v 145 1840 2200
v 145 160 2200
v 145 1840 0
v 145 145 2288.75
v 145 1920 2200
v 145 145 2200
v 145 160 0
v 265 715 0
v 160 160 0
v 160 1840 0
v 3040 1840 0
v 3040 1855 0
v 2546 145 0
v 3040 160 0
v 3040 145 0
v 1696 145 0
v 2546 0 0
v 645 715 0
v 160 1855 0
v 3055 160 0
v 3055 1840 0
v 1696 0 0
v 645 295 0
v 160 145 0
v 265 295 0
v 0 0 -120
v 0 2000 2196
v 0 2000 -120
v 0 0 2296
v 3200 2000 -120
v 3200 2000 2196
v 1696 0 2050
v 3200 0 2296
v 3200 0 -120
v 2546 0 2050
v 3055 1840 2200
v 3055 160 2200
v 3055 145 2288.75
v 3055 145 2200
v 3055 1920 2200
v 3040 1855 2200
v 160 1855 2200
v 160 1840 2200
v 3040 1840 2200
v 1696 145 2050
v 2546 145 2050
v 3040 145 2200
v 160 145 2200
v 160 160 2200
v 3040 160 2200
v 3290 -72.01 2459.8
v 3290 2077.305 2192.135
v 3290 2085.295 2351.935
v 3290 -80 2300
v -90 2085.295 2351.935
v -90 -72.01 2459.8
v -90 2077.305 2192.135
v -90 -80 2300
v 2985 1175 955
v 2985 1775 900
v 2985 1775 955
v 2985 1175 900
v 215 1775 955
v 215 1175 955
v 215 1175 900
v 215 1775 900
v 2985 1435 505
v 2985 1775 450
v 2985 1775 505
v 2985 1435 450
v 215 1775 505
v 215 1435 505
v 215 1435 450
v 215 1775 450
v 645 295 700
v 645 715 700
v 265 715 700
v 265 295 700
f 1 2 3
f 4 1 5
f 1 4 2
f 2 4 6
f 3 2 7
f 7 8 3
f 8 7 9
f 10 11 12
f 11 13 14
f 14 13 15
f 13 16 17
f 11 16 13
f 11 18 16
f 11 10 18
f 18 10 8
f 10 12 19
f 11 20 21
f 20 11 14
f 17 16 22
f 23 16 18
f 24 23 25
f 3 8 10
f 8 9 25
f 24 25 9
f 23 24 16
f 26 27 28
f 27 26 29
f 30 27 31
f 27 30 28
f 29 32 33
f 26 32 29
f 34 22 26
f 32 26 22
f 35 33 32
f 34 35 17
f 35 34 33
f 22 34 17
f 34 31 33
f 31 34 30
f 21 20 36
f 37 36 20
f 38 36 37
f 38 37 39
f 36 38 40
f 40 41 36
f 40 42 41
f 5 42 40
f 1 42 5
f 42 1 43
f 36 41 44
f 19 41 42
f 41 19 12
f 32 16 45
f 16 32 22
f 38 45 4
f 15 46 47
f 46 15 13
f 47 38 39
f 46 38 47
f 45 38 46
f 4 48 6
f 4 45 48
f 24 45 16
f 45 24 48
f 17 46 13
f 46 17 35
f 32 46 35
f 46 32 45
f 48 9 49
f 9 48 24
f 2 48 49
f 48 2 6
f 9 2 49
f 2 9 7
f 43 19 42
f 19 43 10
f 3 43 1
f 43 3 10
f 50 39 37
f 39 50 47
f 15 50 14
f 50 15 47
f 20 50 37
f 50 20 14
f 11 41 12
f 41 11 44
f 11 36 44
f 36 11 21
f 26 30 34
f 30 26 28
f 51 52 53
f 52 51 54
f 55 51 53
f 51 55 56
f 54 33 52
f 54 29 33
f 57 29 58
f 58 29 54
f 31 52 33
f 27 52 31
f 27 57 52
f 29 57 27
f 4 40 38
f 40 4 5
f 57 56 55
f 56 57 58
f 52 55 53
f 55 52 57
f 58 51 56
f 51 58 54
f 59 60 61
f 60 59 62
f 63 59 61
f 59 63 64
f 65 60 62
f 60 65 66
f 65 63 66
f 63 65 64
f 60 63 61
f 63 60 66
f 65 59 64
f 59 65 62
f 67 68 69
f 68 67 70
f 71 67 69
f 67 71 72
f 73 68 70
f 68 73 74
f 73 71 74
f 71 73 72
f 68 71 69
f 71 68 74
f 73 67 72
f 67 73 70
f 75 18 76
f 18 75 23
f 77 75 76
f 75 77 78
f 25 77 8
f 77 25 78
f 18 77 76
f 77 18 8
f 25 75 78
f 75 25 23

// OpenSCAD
// Gartensauna Konzept V2 – alle Maße in mm
// Visualisierungsmodell, keine Bau- oder Statikfreigabe.
// In OpenSCAD öffnen, F5 Vorschau, F6 Rendern. Ansicht umschalten.
variant = "planung"; // ["bestand","planung"]
view = "assembled"; // ["assembled","exploded","structure"]
W = 3200;
D = variant == "bestand" ? 1700 : 2000;
H_front = 2300; // Annahme
H_back = 2200;  // Annahme
wall = 145;     // Beispielgesamtwandstärke, NICHT festgelegt
floor_h = 120;  // Platzhalter
roof_h = 160;   // Platzhalter
explode = view == "exploded" ? 430 : 0;
show_cladding = view != "structure";
$fn = 24;
module panel(pos, size, rgb, a=1) { color(rgb,a) translate(pos) cube(size); }
module shell(){
    // Boden / Tragplatte (Platzhalter)
    panel([0,0,-floor_h-explode],[W,D,floor_h],[0.48,0.48,0.48]);
    // Ständer und Wandkörper (schematisch, ohne konstruktive Freigabe)
    if(show_cladding) {
      panel([0,0,0],[wall,D,H_front],[0.69,0.49,0.28],0.65);
      panel([W-wall,0,0],[wall,D,H_front],[0.69,0.49,0.28],0.65);
      panel([wall,D-wall,0],[W-2*wall,wall,H_back],[0.69,0.49,0.28],0.65);
      // Front geteilt, Türöffnung mittig rechts
      panel([wall,0,0],[W*0.53-wall,wall,H_front],[0.69,0.49,0.28],0.65);
      panel([W*0.53+850,0,0],[W-(W*0.53+850)-wall,wall,H_front],[0.69,0.49,0.28],0.65);
      panel([W*0.53,0,2050],[850,wall,H_front-2050],[0.69,0.49,0.28],0.65);
    }
    // Ständer schematisch
    for(x=[80,W-160]) for(y=[80,D-160])
      panel([x,y,0],[80,80,H_back],[0.56,0.31,0.13]);
    // Dach als Pultdach-Scheibe, Neigung nur schematisch
    translate([0,-80,H_front+explode])
      rotate([atan((H_back-H_front)/D),0,0])
      panel([-90,0,0],[W+180,D+160,roof_h],[0.27,0.31,0.34],0.85);
}
module interior(){
    // Bänke an Rückwand – Positionen nur zur Veranschaulichung
    panel([wall+70,D-wall-680,900],[W-2*wall-140,600,55],[0.86,0.66,0.39]);
    panel([wall+70,D-wall-420,450],[W-2*wall-140,340,55],[0.79,0.58,0.32]);
    // Ofenplatzhalter links vorne
    panel([wall+120,wall+150,0],[380,420,700],[0.33,0.36,0.39]);
}
shell();
if(view != "structure") interior();
